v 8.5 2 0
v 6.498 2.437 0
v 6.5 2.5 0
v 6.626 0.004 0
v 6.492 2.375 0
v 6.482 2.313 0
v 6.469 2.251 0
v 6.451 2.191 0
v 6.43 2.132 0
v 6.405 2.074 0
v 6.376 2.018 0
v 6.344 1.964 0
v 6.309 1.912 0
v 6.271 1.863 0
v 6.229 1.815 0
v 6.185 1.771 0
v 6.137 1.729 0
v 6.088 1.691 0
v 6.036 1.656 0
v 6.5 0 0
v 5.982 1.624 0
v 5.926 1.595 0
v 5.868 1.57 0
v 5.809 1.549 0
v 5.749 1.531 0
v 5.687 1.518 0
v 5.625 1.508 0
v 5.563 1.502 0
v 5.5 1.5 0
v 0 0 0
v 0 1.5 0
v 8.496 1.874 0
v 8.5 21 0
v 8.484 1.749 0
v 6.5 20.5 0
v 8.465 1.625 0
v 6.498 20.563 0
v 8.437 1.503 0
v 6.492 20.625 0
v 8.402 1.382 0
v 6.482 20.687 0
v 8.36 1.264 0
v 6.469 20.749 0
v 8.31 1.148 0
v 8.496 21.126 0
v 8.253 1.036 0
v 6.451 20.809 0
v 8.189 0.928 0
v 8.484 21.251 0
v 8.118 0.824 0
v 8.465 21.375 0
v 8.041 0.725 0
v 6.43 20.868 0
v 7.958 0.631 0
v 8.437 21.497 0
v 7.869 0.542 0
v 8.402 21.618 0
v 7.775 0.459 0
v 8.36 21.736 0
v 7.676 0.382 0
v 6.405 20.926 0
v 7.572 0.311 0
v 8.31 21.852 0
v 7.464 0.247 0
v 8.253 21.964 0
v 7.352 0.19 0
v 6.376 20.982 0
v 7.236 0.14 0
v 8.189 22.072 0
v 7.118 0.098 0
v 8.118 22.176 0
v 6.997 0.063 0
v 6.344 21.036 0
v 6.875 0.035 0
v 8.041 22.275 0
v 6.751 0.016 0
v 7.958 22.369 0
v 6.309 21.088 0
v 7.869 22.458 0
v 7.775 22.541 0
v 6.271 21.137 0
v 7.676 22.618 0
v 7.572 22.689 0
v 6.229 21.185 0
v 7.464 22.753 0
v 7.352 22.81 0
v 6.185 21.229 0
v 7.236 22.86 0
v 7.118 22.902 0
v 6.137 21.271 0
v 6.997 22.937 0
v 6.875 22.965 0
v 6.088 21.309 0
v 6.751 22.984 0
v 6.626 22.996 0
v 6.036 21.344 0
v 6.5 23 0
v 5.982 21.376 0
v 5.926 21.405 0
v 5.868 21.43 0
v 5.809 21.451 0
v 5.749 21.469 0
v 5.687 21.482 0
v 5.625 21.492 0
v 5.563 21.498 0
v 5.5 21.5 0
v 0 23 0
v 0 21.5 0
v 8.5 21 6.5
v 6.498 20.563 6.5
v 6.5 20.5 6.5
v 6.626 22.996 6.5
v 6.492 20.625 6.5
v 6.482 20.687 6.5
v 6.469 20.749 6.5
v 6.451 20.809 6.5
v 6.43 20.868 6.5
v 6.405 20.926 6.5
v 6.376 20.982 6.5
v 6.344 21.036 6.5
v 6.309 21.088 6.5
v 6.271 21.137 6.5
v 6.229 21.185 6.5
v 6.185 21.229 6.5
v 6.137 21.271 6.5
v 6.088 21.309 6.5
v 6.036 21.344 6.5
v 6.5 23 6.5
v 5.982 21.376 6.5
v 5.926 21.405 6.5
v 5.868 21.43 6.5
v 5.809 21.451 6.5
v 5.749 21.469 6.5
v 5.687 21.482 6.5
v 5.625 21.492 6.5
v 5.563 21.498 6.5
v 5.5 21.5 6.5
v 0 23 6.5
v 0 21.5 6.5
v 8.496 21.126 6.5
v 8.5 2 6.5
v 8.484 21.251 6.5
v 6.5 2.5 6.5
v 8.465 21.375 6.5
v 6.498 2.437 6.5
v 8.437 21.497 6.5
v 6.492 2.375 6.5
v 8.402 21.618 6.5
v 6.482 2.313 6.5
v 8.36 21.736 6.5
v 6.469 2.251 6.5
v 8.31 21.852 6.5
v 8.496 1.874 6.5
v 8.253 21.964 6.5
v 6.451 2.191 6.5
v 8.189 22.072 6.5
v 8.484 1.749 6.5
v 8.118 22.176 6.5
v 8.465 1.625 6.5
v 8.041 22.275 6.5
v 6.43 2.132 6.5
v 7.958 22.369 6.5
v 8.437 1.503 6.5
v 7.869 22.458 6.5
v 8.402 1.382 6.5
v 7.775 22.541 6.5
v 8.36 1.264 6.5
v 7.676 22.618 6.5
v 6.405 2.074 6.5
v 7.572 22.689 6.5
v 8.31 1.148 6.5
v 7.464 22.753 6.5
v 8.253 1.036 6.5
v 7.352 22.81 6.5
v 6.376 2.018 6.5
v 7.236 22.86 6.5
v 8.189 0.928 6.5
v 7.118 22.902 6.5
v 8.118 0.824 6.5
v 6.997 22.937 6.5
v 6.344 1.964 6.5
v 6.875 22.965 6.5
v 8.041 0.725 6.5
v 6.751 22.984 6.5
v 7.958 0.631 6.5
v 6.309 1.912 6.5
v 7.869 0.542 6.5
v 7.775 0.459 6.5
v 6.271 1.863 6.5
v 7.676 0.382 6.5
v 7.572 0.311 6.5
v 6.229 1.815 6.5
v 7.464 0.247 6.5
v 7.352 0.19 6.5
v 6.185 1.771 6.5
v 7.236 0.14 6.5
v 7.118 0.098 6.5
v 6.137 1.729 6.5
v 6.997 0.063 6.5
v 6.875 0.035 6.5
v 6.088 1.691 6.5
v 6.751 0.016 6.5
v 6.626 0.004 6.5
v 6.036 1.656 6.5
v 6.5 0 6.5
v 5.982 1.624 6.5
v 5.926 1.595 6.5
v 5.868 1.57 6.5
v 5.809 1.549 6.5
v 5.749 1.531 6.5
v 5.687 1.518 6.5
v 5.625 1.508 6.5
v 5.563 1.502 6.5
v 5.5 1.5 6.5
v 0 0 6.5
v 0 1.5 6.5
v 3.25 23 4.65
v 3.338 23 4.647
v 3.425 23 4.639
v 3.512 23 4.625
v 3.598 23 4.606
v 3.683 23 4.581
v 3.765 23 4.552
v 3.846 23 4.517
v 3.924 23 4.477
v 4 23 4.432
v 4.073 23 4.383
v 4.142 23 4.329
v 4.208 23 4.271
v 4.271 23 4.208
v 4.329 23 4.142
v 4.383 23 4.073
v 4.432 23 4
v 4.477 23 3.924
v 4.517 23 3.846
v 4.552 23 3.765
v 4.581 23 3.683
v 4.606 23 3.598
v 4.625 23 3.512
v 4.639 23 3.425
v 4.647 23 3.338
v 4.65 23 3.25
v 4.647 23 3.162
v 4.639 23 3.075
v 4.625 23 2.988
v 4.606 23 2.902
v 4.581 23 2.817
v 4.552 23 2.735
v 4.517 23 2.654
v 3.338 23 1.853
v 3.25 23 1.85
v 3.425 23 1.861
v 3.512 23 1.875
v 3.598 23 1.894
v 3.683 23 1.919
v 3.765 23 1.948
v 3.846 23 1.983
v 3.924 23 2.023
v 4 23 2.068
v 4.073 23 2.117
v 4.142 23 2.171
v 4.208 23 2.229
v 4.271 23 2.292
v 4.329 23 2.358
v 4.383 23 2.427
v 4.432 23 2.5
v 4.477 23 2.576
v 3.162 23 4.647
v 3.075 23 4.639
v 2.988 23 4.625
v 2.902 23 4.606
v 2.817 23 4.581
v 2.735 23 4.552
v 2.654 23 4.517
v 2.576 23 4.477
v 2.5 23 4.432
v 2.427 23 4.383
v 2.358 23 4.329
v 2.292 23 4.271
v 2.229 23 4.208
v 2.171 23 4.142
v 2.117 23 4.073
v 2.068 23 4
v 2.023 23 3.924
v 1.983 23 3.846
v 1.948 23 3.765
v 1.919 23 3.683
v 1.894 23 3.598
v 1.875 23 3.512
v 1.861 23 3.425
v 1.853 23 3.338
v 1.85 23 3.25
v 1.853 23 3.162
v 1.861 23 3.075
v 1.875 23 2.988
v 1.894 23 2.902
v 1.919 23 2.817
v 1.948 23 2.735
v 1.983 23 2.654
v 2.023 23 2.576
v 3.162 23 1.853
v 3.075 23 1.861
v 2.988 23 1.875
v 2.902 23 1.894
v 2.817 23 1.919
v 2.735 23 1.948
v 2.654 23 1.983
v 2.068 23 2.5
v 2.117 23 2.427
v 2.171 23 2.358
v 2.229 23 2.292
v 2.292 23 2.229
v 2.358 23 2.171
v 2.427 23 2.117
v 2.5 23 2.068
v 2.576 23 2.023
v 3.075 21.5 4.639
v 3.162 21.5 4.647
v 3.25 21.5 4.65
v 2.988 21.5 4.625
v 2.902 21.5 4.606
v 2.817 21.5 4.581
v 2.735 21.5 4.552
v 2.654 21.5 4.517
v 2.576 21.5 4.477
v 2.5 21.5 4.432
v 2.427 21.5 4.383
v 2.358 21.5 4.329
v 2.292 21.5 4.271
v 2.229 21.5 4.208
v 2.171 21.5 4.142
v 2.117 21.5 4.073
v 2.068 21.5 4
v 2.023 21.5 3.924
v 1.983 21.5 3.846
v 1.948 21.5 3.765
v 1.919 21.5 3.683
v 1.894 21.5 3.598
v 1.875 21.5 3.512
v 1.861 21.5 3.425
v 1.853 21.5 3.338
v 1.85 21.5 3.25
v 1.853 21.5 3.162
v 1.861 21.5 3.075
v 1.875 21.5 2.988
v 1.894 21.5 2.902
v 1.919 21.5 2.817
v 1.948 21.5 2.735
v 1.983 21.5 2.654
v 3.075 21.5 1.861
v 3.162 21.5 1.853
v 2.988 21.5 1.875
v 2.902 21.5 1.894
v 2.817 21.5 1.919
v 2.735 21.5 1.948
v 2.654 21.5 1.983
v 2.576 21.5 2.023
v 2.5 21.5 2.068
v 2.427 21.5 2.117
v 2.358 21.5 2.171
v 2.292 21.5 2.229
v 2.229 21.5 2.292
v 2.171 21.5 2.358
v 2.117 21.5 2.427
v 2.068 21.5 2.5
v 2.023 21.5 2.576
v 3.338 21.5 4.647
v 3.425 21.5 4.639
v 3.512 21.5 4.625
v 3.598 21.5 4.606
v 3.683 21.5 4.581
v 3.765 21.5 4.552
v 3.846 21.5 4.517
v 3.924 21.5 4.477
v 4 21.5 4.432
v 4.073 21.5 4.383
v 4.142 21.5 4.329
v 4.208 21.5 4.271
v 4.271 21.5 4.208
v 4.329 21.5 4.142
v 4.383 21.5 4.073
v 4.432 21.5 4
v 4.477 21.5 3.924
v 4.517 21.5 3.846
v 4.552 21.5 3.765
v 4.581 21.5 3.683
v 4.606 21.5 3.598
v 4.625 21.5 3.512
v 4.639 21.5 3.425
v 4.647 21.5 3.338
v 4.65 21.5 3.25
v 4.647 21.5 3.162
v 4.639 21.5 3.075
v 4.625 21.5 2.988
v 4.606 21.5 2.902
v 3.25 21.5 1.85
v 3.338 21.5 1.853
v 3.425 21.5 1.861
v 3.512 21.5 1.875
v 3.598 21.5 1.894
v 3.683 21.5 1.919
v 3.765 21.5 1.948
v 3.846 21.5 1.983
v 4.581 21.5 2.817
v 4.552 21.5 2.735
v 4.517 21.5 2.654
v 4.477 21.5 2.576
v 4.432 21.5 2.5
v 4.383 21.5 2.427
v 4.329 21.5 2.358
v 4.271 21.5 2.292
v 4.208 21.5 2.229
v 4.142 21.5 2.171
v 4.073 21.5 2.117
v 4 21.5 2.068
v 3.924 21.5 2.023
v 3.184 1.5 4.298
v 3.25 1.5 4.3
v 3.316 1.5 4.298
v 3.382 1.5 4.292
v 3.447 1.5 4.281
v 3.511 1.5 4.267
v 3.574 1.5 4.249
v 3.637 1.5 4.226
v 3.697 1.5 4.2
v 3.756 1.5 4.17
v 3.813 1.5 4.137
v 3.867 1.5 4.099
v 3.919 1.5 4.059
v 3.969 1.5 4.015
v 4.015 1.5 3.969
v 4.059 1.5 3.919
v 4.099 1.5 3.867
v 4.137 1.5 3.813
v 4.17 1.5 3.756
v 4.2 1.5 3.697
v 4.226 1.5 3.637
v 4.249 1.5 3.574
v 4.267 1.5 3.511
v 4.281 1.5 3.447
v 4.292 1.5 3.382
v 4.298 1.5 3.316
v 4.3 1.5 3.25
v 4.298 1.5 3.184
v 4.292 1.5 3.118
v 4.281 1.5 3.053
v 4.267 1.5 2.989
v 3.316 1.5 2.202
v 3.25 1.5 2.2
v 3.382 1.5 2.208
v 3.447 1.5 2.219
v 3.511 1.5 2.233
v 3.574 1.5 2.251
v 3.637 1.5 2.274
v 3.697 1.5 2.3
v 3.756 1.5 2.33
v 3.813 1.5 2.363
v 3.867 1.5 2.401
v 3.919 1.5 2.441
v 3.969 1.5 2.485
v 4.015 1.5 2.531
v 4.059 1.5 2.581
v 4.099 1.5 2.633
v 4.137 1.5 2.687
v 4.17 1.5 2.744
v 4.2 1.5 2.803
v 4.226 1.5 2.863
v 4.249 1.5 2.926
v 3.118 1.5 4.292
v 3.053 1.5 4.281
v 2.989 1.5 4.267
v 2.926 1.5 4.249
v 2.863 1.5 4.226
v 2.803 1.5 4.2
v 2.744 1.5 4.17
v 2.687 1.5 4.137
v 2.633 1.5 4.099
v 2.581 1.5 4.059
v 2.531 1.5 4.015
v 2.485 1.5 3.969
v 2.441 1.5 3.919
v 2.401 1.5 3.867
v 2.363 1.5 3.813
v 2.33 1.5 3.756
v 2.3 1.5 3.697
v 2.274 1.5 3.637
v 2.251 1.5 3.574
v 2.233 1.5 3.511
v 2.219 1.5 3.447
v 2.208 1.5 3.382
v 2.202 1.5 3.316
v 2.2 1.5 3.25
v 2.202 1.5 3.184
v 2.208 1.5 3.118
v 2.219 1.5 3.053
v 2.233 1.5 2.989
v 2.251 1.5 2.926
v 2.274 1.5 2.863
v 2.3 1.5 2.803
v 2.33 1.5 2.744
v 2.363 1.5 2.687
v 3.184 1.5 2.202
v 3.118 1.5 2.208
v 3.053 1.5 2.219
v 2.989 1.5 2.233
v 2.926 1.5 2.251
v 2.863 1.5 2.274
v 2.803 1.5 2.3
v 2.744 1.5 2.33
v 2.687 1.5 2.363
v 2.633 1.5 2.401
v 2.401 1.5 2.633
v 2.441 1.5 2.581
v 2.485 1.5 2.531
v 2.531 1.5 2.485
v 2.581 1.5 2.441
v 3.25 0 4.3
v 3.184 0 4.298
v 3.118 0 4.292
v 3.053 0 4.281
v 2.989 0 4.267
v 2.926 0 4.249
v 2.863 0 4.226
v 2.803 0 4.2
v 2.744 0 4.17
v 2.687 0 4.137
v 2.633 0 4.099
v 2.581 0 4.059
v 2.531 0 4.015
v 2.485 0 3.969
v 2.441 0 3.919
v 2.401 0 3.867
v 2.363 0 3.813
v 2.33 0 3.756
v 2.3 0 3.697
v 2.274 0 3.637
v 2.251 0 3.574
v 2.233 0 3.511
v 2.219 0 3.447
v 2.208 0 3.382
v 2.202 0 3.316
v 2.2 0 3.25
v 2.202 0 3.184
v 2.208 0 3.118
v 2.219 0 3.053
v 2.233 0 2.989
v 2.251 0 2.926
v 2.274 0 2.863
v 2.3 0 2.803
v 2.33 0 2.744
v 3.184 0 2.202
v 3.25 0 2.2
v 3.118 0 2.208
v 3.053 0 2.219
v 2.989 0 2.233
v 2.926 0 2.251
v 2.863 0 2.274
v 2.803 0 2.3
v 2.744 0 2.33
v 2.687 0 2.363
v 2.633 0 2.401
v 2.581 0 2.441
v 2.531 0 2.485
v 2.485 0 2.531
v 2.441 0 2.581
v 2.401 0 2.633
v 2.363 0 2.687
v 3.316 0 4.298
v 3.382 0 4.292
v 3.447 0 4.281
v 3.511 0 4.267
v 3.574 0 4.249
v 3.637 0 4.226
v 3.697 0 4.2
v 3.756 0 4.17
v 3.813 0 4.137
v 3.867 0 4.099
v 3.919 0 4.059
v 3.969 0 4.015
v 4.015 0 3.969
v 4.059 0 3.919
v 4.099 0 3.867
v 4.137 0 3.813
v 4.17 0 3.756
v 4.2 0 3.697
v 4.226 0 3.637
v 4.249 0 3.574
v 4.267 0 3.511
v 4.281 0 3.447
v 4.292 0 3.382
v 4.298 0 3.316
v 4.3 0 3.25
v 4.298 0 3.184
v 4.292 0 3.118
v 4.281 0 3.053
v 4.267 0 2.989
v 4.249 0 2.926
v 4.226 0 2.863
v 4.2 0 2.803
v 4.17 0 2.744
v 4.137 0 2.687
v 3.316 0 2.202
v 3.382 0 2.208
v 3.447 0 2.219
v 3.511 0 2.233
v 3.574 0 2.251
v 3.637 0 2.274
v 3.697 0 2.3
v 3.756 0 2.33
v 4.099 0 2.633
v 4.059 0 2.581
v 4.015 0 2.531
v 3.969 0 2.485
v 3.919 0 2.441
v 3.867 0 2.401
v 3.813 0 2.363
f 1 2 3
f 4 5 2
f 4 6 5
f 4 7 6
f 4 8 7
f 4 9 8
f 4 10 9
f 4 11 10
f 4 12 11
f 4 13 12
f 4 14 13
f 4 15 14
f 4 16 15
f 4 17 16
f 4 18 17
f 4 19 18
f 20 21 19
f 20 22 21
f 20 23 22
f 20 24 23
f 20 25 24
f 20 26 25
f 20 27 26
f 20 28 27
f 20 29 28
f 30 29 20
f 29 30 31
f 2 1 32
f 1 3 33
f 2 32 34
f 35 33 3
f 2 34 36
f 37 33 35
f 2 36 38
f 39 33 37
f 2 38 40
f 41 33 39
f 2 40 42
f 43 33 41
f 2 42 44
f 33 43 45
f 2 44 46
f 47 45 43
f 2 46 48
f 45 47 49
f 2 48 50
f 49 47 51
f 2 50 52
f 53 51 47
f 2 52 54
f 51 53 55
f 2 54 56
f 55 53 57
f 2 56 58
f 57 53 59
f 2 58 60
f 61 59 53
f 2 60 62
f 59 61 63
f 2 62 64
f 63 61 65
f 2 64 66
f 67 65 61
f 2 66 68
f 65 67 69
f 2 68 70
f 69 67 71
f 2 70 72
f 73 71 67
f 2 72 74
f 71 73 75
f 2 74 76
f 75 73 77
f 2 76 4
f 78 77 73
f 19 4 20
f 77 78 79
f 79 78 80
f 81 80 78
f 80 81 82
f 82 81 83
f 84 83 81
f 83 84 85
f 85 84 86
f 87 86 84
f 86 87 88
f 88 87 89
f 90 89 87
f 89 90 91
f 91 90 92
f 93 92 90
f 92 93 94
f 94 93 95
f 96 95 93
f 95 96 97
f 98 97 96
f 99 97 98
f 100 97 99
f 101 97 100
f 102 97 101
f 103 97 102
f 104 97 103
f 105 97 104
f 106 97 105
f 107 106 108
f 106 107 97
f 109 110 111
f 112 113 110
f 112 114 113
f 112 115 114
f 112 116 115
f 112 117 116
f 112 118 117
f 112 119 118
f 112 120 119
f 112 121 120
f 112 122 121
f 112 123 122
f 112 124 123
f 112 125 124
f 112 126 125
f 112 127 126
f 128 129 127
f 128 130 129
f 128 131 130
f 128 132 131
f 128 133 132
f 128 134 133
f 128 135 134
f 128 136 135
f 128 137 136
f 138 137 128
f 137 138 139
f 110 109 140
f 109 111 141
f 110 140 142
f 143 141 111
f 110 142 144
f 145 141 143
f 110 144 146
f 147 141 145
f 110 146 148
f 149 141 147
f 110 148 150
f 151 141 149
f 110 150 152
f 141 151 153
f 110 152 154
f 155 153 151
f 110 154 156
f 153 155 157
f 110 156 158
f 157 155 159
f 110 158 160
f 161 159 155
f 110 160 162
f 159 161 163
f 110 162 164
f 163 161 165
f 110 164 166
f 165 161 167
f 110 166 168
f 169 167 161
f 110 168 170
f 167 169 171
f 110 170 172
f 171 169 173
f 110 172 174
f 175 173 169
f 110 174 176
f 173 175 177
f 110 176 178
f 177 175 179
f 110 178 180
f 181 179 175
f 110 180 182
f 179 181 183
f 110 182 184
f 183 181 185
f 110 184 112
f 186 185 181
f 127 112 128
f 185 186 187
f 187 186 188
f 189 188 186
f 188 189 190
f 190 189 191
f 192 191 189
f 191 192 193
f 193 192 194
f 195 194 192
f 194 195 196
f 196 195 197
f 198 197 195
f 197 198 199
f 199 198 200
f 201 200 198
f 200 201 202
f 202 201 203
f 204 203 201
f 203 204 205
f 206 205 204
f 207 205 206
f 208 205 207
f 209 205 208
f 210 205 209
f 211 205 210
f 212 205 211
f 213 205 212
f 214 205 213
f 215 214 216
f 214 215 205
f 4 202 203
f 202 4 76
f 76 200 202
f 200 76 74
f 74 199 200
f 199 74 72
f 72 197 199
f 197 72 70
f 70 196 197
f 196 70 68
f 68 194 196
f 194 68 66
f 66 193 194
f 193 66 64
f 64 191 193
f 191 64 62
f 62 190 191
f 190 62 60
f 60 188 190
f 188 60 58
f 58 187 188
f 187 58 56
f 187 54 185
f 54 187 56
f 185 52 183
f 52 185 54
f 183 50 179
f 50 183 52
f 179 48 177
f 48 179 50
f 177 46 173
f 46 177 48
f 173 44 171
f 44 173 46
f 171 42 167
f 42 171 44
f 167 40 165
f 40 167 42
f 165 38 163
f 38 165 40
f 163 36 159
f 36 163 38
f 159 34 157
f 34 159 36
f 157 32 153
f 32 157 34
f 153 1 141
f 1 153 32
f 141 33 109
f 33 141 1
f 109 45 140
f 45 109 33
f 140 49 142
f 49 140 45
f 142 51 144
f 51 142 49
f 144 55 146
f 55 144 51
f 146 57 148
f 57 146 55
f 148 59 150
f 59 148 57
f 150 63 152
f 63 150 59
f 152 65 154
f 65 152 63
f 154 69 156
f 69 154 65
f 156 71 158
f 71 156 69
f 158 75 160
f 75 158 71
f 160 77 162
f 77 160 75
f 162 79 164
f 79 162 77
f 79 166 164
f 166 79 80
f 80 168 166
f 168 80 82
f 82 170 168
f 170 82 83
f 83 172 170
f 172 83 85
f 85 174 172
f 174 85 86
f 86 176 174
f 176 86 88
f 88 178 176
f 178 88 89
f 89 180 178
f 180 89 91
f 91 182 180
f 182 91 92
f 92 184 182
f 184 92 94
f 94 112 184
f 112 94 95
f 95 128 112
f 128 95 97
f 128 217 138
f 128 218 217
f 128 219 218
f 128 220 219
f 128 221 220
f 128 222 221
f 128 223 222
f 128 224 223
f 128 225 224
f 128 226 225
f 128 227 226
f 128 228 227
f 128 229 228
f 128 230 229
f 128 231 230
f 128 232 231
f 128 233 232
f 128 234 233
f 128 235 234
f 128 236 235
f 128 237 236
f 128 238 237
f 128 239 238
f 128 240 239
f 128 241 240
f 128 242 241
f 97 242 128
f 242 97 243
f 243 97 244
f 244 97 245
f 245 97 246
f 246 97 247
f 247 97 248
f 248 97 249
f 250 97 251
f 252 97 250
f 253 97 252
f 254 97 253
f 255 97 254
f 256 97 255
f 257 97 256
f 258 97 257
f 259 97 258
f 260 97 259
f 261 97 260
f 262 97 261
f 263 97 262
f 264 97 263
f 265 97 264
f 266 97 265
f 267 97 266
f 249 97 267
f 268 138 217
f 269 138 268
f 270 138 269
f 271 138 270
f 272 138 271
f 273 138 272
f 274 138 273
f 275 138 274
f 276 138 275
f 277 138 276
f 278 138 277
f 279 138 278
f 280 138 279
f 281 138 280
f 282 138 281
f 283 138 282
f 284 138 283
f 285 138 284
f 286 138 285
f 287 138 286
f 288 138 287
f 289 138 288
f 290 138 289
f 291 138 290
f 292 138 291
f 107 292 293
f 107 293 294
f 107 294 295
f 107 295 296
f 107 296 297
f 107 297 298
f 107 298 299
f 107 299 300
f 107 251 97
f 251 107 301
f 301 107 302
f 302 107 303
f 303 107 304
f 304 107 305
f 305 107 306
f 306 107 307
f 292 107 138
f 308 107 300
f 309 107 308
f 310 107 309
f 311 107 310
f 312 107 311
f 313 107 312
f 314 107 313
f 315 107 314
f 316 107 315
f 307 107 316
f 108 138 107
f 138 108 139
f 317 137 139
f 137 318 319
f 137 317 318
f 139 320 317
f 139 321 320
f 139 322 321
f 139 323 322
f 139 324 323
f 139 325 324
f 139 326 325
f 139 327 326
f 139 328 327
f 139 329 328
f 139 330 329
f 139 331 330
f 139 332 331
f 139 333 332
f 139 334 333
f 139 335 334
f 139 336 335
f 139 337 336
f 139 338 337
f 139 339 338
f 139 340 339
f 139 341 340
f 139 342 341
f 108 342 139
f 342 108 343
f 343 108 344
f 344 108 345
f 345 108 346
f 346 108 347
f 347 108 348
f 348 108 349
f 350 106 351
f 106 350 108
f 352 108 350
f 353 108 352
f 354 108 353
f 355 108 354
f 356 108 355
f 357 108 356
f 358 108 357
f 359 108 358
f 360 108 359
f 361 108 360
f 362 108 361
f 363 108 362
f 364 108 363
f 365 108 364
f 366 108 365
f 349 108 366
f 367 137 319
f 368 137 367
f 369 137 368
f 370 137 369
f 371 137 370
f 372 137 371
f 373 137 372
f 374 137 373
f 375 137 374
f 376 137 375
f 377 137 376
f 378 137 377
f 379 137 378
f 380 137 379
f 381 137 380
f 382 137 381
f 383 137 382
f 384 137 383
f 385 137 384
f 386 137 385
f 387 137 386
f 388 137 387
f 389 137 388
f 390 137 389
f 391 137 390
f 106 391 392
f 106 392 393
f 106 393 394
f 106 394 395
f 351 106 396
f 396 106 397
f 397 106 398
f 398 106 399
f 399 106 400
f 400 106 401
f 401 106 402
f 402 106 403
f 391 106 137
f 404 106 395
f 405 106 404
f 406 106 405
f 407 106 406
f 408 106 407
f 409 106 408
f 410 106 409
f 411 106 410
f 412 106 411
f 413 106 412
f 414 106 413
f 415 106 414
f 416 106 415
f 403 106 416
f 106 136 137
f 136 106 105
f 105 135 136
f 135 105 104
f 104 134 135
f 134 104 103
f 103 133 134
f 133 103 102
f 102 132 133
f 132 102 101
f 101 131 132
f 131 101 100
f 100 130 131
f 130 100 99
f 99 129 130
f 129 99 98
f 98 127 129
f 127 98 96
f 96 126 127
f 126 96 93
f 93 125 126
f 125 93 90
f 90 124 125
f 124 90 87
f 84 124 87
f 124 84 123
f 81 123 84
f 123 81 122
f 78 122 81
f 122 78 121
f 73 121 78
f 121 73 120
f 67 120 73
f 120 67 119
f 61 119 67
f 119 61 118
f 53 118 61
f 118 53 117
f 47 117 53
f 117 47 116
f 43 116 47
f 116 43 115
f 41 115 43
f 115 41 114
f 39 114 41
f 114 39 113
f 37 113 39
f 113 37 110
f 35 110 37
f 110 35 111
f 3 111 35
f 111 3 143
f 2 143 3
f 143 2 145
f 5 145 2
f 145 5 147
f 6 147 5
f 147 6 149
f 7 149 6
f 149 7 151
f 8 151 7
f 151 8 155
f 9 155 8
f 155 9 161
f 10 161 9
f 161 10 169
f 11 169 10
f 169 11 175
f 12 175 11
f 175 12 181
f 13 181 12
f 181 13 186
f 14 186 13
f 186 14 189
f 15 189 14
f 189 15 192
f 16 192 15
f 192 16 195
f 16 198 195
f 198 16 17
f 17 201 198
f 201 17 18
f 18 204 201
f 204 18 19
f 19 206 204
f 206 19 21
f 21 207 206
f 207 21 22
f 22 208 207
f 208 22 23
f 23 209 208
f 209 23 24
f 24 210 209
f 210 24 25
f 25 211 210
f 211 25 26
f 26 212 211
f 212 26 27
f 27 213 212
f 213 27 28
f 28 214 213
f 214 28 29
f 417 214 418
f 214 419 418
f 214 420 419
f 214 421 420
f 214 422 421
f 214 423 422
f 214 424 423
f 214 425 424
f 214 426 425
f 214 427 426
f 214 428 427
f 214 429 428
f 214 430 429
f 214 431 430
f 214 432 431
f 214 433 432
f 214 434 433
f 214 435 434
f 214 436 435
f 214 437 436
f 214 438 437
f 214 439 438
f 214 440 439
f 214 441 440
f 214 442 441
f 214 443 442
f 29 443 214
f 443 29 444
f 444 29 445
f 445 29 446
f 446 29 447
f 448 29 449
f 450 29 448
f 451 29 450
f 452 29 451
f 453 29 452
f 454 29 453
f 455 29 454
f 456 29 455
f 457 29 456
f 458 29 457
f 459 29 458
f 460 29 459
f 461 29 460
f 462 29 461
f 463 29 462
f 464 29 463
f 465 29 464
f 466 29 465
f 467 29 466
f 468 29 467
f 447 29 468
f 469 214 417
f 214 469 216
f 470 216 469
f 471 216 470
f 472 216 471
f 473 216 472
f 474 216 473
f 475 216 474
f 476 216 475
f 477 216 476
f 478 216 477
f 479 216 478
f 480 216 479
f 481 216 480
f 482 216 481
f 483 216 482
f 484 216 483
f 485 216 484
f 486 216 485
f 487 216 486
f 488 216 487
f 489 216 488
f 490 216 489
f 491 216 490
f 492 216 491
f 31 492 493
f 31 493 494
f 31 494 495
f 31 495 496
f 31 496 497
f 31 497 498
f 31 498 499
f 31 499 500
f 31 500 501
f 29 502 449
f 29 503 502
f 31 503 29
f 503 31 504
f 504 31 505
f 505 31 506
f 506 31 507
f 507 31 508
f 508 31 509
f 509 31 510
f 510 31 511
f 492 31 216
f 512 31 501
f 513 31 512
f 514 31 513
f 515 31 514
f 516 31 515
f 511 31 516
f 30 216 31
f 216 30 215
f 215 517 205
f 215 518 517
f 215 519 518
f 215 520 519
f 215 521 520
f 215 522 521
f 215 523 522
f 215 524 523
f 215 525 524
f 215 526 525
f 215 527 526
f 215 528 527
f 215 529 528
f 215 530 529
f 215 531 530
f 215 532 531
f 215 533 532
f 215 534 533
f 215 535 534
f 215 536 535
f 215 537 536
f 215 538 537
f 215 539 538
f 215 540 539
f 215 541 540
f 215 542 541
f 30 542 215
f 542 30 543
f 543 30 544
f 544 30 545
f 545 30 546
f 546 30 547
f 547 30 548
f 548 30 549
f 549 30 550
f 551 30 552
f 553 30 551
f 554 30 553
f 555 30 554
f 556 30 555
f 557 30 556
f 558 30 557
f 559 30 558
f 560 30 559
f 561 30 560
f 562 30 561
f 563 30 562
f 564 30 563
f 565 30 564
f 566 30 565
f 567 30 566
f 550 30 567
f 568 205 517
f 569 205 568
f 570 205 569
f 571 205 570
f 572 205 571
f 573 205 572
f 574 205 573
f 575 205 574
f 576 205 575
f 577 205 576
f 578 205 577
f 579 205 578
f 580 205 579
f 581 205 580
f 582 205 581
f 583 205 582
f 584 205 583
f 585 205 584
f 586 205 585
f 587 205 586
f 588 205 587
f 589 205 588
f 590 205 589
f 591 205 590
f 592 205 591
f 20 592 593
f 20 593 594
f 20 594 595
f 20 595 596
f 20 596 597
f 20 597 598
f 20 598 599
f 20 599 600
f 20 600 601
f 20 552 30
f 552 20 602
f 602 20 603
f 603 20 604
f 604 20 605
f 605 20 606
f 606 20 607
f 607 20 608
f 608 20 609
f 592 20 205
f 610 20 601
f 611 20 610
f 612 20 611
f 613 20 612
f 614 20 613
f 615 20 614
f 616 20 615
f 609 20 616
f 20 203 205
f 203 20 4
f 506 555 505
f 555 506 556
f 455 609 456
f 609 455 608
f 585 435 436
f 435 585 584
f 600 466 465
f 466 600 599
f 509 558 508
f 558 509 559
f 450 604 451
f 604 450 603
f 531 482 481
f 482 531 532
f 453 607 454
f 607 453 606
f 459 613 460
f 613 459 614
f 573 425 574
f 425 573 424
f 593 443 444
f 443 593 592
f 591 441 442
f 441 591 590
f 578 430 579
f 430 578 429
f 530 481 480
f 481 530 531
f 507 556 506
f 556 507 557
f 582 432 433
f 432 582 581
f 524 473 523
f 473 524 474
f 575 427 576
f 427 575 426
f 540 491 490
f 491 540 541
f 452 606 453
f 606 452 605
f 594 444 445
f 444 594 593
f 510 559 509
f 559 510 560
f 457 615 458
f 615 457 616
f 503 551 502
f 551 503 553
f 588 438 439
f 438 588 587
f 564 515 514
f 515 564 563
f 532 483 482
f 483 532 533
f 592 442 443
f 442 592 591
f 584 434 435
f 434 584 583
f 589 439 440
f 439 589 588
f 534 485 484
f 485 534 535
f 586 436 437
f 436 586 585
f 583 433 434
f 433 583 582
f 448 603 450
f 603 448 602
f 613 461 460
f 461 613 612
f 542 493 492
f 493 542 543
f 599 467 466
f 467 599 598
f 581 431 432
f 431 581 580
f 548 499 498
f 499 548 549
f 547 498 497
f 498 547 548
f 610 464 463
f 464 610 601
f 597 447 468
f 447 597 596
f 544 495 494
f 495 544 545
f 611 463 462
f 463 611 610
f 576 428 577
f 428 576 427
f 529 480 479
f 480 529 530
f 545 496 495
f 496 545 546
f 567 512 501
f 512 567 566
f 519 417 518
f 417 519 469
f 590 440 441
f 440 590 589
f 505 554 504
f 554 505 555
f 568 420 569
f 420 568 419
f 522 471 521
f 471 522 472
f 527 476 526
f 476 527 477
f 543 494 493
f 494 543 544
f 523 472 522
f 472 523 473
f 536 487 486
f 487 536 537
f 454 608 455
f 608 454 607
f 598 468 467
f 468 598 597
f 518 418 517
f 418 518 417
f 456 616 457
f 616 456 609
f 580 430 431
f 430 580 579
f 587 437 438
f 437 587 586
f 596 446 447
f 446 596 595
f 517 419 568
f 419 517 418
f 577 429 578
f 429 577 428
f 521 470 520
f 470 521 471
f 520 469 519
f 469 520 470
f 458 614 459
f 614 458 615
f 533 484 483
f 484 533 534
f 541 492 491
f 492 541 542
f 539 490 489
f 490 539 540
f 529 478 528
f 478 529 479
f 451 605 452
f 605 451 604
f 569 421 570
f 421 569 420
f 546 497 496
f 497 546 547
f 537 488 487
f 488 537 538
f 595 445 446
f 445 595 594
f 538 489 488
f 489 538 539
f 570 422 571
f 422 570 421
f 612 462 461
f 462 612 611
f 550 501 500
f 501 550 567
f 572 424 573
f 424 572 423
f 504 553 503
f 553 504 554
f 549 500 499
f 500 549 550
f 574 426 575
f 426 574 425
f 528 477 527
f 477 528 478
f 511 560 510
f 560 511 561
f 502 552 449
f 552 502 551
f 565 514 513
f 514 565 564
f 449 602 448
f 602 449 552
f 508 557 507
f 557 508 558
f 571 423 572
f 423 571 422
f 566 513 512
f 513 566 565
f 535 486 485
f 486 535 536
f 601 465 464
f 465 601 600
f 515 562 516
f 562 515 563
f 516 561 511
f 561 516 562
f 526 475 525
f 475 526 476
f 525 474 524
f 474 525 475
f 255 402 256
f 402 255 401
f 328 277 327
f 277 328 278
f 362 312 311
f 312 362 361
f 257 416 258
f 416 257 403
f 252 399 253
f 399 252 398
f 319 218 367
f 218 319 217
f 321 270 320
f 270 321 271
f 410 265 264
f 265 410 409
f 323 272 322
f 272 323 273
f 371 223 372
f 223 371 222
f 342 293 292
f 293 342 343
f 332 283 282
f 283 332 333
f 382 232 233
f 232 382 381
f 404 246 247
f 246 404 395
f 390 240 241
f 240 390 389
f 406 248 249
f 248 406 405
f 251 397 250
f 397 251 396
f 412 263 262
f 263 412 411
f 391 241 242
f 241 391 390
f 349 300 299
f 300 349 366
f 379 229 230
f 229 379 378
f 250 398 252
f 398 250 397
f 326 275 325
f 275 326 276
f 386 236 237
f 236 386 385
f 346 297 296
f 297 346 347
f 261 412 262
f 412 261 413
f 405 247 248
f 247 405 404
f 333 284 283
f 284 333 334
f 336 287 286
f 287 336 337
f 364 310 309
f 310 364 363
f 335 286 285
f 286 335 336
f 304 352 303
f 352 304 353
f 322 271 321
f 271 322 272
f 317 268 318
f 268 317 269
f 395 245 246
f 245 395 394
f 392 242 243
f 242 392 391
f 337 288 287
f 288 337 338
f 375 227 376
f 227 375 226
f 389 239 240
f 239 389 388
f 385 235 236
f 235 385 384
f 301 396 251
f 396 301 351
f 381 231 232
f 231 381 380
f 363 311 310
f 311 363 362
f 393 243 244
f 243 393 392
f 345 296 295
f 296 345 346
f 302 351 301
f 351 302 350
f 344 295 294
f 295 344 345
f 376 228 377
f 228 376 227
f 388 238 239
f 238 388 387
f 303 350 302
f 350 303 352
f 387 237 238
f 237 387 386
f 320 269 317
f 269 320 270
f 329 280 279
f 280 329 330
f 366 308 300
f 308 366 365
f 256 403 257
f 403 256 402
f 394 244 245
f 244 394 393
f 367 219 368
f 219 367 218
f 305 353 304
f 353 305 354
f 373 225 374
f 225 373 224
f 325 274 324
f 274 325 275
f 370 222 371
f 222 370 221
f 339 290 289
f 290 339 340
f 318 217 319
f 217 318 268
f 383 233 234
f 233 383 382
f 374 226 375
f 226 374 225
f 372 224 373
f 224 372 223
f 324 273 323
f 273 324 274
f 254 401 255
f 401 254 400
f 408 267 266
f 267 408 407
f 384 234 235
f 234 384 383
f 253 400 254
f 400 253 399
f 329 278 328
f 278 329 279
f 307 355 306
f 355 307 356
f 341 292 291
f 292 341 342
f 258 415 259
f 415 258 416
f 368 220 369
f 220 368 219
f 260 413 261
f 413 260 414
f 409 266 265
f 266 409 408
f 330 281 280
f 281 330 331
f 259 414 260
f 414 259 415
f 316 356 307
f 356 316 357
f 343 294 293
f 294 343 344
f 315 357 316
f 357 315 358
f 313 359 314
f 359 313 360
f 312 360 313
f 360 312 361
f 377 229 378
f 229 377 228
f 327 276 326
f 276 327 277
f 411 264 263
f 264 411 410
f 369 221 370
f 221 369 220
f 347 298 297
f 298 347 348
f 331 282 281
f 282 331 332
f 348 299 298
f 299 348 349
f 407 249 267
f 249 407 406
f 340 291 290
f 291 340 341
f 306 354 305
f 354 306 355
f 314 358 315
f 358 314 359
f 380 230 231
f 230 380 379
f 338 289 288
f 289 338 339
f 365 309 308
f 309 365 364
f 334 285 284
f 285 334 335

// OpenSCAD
// 3D-Printable C-Shaped Corner Spacer Bracket
// 6.5x6.5mm Pads, 1.5mm Thickness, 20mm Gap, 2mm Wall

$fn = 100; // High resolution for perfect circles

// --- Key Dimensions ---
gap = 20.0;         // Gap between mounting surfaces
pad_len = 6.5;      // Pad length (X axis)
pad_w = 6.5;        // Pad width (Z axis, extruded thickness)
pad_t = 1.5;        // Pad thickness (Y axis)
wall = 2.0;         // Wall thickness
hole_d_bottom = 2.1; // Bottom pad hole
hole_d_top = 2.8;    // Top pad hole (M2.5 screw clearance)

r_out = 2.0;        // Outer corner rounding
r_in = 1.0;         // Inner corner rounding

// --- Derived Calculations ---
total_h = pad_t + gap + pad_t; // 23.0 mm total height
total_d = pad_len + wall;      // 8.5 mm total depth

// --- 3D Generation ---
difference() {
    // 1. Main Bracket Body (Generated lying flat)
    linear_extrude(height = pad_w) {
        difference() {
            // Outer Boundary Shape
            hull() {
                translate([0, 0]) square([0.1, total_h]);
                translate([total_d - r_out, r_out]) circle(r=r_out);
                translate([total_d - r_out, total_h - r_out]) circle(r=r_out);
            }

            // Inner Cutout Shape (Fixed to guarantee flat 1.5mm pads)
            hull() {
                // Front opening
                translate([-1, pad_t]) square([0.1, gap]);
                // Force perfectly horizontal cuts for the pads
                translate([-1, pad_t]) square([pad_len - r_in + 1, 0.01]);
                translate([-1, total_h - pad_t - 0.01]) square([pad_len - r_in + 1, 0.01]);
                // Inner rounded corners
                translate([pad_len - r_in, pad_t + r_in]) circle(r=r_in);
                translate([pad_len - r_in, total_h - pad_t - r_in]) circle(r=r_in);
            }
        }
    }

    // 2. Center-Punch Bottom Pad Hole
    translate([pad_len / 2, pad_t / 2, pad_w / 2])
        rotate([90, 0, 0])
        cylinder(h = pad_t * 4, d = hole_d_bottom, center = true);

    // 3. Center-Punch Top Pad Hole
    translate([pad_len / 2, total_h - (pad_t / 2), pad_w / 2])
        rotate([90, 0, 0])
        cylinder(h = pad_t * 4, d = hole_d_top, center = true);
}
